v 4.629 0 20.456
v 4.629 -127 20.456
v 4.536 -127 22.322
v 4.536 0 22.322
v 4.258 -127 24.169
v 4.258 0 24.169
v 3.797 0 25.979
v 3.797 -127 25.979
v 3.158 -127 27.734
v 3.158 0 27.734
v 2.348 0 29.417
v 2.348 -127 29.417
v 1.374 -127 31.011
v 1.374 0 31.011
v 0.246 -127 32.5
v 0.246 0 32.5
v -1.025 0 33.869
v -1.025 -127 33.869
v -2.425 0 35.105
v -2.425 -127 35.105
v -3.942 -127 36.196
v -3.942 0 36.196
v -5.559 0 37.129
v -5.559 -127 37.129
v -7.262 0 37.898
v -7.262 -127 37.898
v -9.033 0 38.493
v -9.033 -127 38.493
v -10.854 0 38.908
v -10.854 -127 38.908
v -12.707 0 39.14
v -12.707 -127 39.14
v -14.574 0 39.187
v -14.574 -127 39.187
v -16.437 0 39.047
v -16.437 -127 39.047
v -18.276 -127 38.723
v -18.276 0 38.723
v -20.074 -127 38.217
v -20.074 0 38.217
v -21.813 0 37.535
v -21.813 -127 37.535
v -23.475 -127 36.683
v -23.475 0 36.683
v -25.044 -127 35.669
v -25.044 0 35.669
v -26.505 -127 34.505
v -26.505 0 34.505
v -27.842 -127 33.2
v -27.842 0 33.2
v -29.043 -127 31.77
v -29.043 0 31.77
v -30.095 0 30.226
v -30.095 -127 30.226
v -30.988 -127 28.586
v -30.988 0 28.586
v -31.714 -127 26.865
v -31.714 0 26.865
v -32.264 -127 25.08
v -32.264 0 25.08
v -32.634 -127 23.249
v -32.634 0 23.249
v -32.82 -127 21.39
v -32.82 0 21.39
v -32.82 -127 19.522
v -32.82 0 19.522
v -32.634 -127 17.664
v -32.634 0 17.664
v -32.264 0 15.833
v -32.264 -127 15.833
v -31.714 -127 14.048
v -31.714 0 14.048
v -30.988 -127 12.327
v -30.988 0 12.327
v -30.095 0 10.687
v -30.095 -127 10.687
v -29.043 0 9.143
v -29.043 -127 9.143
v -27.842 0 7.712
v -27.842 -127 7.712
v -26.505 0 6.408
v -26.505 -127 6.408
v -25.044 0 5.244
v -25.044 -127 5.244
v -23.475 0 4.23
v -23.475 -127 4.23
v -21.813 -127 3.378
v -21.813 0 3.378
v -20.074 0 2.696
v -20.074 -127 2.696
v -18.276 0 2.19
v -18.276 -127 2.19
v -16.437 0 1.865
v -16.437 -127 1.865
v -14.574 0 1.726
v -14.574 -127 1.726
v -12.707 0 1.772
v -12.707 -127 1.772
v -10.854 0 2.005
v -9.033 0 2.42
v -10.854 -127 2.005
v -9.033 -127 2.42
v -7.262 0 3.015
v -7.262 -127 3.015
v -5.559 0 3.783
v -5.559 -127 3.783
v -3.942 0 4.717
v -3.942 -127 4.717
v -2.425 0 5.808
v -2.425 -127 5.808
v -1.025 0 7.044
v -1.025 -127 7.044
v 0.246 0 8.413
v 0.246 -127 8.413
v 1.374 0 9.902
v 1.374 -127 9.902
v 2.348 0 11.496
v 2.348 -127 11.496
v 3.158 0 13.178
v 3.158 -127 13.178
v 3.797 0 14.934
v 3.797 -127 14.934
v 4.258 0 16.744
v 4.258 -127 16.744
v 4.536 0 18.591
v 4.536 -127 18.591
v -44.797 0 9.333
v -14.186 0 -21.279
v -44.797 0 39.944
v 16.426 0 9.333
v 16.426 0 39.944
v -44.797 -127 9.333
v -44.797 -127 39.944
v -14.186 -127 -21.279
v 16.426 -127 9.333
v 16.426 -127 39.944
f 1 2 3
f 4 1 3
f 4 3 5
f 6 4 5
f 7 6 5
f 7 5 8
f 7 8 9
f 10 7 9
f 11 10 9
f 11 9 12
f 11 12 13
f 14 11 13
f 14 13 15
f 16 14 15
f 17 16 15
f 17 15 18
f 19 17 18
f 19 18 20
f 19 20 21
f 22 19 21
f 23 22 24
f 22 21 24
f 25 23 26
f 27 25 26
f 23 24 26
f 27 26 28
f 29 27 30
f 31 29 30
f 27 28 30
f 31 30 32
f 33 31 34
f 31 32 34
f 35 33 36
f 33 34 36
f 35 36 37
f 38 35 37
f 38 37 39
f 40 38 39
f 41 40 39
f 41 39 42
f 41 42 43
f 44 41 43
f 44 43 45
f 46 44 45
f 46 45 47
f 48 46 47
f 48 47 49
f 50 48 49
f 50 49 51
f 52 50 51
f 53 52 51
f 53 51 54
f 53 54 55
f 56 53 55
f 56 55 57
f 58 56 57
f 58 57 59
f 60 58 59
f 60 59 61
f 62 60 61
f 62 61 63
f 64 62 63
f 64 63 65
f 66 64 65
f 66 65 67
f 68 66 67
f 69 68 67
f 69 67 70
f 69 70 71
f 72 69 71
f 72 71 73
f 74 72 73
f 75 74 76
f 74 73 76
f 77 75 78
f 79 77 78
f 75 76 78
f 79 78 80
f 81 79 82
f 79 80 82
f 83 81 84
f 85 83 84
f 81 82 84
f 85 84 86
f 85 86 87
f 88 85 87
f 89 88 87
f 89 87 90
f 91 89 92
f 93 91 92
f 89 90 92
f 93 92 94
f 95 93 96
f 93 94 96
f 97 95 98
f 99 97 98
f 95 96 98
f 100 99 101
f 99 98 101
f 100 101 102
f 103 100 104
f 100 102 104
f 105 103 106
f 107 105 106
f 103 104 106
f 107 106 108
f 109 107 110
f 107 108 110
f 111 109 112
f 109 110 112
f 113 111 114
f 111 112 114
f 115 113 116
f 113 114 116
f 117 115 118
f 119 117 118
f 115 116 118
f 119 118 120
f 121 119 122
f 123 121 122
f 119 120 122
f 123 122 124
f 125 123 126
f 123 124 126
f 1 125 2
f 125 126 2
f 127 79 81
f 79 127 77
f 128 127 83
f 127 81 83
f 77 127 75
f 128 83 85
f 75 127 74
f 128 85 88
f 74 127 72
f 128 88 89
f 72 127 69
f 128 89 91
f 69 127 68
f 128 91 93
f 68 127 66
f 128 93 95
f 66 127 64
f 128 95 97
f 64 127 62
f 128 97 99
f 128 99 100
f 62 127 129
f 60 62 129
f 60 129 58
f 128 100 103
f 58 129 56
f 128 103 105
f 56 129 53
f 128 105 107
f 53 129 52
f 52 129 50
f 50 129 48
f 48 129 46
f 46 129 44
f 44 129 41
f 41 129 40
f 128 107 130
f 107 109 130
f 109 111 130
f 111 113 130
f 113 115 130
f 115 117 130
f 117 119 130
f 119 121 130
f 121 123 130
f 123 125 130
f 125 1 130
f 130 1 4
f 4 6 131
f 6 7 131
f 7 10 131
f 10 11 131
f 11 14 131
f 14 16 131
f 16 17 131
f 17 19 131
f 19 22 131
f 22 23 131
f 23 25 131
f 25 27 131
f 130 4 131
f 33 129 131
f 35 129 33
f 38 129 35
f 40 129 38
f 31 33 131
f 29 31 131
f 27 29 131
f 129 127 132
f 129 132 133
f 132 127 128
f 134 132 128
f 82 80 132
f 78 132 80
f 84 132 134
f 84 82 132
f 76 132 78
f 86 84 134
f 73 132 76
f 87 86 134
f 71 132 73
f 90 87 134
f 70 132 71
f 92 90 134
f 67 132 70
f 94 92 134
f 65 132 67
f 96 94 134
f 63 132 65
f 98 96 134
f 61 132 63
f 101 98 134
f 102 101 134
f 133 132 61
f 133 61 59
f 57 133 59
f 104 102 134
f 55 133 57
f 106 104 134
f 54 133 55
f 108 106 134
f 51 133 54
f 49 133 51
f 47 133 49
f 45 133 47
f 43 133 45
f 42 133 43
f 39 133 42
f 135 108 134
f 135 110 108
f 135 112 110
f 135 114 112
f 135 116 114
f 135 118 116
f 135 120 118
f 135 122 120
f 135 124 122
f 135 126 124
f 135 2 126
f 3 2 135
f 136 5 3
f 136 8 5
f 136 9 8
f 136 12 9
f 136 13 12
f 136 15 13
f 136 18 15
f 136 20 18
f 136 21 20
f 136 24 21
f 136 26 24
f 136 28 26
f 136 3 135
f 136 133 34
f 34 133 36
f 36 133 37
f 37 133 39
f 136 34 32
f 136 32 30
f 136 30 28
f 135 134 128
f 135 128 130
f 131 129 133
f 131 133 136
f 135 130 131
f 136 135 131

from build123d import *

# Parameters (mm, degrees)
F0_W     = 61.2226556987
F0_H     = 61.2226556987
F1_DEPTH = 127
F2_R     = 18.7364808047
F3_DEPTH = 127.001
F5_DEPTH = 127.001


with BuildPart() as f1:
    # F0 (on Front) → F1 (new body)
    with BuildSketch(Plane.XZ):
        with Locations((-14.1857275739, 9.3327248469)):
            Rectangle(F0_W, F0_H)
    extrude(amount=F1_DEPTH)

    # F2 (on face) → F3 (cut, through all)
    with BuildSketch(Plane.XZ.offset(127)):
        with Locations((-14.1071435064, 20.4563848674)):
            Circle(F2_R)
    extrude(amount=-F3_DEPTH, mode=Mode.SUBTRACT)

    # F4 (on face) → F5 (cut, through all)
    with BuildSketch(Plane(origin=(0, 0, 0), x_dir=(-1, 0, 0), z_dir=(0, 1, 0))):
        Polygon((-16.4256002754, -21.2786030024), (14.1857275739, -21.2786030024), (-16.4256002754, 9.3327248469), align=None)
        Polygon((44.7970554233, 9.3327248469), (14.1857275739, -21.2786030024), (44.7970554233, -21.2786030024), align=None)
    extrude(amount=-F5_DEPTH, mode=Mode.SUBTRACT)


solid = f1.part
